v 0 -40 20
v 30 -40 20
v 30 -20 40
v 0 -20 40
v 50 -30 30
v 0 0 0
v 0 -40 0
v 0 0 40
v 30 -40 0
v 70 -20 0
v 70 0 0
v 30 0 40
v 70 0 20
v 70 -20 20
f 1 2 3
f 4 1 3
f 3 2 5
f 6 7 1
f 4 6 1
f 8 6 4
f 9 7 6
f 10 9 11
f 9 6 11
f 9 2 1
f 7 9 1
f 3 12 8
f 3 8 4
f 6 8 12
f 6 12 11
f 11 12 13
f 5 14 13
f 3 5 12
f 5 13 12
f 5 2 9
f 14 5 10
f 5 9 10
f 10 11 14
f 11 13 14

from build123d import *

# Parameters (mm, degrees)
F0_W      = 70
F0_H      = 40
F1_DEPTH  = 40
F3_DEPTH  = 70
F4_DEPTH  = 140
F6_DEPTH  = 40
F8_DEPTH  = 40
F9_DEPTH  = 80
F11_DEPTH = 10


with BuildPart() as f1:
    # F0 (on Front) → F1 (new body)
    with BuildSketch(Plane.XZ):
        with Locations((35, 20)):
            Rectangle(F0_W, F0_H)
    extrude(amount=F1_DEPTH)

    # F2 (on face) → F3 (join)
    with BuildSketch(Plane.YZ.offset(70)):
        Polygon((-20, 40), (-40, 40), (-40, 20), align=None)
    extrude(amount=F3_DEPTH)

    # F3_face (on face) → F4 (cut)
    with BuildSketch(Plane(origin=(140, -33.333333, 33.333333), x_dir=(0, 1, 0), z_dir=(1, 0, 0))):
        Polygon((13.333333, 6.666667), (-6.666667, 6.666667), (-6.666667, -13.333333), align=None)
    extrude(amount=-F4_DEPTH, mode=Mode.SUBTRACT)

    # F5 (on face) → F6 (cut)
    with BuildSketch(Plane(origin=(0, 0, 0), x_dir=(-1, 0, 0), z_dir=(0, 1, 0))):
        Polygon((-70, 40), (-70, 20), (-30, 40), align=None)
    extrude(amount=-F6_DEPTH, mode=Mode.SUBTRACT)

    # F7 (on face) → F8 (join)
    with BuildSketch(Plane(origin=(0, 0, 0), x_dir=(1, 0, 0), z_dir=(0, 0, -1))):
        Polygon((70, 20), (70, 40), (30, 40), align=None)
    extrude(amount=F8_DEPTH)

    # F8_face (on face) → F9 (cut)
    with BuildSketch(Plane(origin=(56.666667, -33.333333, -40), x_dir=(1, 0, 0), z_dir=(0, 0, -1))):
        Polygon((13.333333, -13.333333), (13.333333, 6.666667), (-26.666667, 6.666667), align=None)
    extrude(amount=-F9_DEPTH, mode=Mode.SUBTRACT)

    # F10 (on face) → F11 (join)
    with BuildSketch(Plane(origin=(0, -30, 30), x_dir=(1, 0, 0), z_dir=(0, -0.707107, 0.707107))):
        Polygon((50, 0), (30, 14.142136), (30, -14.142136), align=None)
    extrude(amount=-F11_DEPTH)


solid = f1.part
